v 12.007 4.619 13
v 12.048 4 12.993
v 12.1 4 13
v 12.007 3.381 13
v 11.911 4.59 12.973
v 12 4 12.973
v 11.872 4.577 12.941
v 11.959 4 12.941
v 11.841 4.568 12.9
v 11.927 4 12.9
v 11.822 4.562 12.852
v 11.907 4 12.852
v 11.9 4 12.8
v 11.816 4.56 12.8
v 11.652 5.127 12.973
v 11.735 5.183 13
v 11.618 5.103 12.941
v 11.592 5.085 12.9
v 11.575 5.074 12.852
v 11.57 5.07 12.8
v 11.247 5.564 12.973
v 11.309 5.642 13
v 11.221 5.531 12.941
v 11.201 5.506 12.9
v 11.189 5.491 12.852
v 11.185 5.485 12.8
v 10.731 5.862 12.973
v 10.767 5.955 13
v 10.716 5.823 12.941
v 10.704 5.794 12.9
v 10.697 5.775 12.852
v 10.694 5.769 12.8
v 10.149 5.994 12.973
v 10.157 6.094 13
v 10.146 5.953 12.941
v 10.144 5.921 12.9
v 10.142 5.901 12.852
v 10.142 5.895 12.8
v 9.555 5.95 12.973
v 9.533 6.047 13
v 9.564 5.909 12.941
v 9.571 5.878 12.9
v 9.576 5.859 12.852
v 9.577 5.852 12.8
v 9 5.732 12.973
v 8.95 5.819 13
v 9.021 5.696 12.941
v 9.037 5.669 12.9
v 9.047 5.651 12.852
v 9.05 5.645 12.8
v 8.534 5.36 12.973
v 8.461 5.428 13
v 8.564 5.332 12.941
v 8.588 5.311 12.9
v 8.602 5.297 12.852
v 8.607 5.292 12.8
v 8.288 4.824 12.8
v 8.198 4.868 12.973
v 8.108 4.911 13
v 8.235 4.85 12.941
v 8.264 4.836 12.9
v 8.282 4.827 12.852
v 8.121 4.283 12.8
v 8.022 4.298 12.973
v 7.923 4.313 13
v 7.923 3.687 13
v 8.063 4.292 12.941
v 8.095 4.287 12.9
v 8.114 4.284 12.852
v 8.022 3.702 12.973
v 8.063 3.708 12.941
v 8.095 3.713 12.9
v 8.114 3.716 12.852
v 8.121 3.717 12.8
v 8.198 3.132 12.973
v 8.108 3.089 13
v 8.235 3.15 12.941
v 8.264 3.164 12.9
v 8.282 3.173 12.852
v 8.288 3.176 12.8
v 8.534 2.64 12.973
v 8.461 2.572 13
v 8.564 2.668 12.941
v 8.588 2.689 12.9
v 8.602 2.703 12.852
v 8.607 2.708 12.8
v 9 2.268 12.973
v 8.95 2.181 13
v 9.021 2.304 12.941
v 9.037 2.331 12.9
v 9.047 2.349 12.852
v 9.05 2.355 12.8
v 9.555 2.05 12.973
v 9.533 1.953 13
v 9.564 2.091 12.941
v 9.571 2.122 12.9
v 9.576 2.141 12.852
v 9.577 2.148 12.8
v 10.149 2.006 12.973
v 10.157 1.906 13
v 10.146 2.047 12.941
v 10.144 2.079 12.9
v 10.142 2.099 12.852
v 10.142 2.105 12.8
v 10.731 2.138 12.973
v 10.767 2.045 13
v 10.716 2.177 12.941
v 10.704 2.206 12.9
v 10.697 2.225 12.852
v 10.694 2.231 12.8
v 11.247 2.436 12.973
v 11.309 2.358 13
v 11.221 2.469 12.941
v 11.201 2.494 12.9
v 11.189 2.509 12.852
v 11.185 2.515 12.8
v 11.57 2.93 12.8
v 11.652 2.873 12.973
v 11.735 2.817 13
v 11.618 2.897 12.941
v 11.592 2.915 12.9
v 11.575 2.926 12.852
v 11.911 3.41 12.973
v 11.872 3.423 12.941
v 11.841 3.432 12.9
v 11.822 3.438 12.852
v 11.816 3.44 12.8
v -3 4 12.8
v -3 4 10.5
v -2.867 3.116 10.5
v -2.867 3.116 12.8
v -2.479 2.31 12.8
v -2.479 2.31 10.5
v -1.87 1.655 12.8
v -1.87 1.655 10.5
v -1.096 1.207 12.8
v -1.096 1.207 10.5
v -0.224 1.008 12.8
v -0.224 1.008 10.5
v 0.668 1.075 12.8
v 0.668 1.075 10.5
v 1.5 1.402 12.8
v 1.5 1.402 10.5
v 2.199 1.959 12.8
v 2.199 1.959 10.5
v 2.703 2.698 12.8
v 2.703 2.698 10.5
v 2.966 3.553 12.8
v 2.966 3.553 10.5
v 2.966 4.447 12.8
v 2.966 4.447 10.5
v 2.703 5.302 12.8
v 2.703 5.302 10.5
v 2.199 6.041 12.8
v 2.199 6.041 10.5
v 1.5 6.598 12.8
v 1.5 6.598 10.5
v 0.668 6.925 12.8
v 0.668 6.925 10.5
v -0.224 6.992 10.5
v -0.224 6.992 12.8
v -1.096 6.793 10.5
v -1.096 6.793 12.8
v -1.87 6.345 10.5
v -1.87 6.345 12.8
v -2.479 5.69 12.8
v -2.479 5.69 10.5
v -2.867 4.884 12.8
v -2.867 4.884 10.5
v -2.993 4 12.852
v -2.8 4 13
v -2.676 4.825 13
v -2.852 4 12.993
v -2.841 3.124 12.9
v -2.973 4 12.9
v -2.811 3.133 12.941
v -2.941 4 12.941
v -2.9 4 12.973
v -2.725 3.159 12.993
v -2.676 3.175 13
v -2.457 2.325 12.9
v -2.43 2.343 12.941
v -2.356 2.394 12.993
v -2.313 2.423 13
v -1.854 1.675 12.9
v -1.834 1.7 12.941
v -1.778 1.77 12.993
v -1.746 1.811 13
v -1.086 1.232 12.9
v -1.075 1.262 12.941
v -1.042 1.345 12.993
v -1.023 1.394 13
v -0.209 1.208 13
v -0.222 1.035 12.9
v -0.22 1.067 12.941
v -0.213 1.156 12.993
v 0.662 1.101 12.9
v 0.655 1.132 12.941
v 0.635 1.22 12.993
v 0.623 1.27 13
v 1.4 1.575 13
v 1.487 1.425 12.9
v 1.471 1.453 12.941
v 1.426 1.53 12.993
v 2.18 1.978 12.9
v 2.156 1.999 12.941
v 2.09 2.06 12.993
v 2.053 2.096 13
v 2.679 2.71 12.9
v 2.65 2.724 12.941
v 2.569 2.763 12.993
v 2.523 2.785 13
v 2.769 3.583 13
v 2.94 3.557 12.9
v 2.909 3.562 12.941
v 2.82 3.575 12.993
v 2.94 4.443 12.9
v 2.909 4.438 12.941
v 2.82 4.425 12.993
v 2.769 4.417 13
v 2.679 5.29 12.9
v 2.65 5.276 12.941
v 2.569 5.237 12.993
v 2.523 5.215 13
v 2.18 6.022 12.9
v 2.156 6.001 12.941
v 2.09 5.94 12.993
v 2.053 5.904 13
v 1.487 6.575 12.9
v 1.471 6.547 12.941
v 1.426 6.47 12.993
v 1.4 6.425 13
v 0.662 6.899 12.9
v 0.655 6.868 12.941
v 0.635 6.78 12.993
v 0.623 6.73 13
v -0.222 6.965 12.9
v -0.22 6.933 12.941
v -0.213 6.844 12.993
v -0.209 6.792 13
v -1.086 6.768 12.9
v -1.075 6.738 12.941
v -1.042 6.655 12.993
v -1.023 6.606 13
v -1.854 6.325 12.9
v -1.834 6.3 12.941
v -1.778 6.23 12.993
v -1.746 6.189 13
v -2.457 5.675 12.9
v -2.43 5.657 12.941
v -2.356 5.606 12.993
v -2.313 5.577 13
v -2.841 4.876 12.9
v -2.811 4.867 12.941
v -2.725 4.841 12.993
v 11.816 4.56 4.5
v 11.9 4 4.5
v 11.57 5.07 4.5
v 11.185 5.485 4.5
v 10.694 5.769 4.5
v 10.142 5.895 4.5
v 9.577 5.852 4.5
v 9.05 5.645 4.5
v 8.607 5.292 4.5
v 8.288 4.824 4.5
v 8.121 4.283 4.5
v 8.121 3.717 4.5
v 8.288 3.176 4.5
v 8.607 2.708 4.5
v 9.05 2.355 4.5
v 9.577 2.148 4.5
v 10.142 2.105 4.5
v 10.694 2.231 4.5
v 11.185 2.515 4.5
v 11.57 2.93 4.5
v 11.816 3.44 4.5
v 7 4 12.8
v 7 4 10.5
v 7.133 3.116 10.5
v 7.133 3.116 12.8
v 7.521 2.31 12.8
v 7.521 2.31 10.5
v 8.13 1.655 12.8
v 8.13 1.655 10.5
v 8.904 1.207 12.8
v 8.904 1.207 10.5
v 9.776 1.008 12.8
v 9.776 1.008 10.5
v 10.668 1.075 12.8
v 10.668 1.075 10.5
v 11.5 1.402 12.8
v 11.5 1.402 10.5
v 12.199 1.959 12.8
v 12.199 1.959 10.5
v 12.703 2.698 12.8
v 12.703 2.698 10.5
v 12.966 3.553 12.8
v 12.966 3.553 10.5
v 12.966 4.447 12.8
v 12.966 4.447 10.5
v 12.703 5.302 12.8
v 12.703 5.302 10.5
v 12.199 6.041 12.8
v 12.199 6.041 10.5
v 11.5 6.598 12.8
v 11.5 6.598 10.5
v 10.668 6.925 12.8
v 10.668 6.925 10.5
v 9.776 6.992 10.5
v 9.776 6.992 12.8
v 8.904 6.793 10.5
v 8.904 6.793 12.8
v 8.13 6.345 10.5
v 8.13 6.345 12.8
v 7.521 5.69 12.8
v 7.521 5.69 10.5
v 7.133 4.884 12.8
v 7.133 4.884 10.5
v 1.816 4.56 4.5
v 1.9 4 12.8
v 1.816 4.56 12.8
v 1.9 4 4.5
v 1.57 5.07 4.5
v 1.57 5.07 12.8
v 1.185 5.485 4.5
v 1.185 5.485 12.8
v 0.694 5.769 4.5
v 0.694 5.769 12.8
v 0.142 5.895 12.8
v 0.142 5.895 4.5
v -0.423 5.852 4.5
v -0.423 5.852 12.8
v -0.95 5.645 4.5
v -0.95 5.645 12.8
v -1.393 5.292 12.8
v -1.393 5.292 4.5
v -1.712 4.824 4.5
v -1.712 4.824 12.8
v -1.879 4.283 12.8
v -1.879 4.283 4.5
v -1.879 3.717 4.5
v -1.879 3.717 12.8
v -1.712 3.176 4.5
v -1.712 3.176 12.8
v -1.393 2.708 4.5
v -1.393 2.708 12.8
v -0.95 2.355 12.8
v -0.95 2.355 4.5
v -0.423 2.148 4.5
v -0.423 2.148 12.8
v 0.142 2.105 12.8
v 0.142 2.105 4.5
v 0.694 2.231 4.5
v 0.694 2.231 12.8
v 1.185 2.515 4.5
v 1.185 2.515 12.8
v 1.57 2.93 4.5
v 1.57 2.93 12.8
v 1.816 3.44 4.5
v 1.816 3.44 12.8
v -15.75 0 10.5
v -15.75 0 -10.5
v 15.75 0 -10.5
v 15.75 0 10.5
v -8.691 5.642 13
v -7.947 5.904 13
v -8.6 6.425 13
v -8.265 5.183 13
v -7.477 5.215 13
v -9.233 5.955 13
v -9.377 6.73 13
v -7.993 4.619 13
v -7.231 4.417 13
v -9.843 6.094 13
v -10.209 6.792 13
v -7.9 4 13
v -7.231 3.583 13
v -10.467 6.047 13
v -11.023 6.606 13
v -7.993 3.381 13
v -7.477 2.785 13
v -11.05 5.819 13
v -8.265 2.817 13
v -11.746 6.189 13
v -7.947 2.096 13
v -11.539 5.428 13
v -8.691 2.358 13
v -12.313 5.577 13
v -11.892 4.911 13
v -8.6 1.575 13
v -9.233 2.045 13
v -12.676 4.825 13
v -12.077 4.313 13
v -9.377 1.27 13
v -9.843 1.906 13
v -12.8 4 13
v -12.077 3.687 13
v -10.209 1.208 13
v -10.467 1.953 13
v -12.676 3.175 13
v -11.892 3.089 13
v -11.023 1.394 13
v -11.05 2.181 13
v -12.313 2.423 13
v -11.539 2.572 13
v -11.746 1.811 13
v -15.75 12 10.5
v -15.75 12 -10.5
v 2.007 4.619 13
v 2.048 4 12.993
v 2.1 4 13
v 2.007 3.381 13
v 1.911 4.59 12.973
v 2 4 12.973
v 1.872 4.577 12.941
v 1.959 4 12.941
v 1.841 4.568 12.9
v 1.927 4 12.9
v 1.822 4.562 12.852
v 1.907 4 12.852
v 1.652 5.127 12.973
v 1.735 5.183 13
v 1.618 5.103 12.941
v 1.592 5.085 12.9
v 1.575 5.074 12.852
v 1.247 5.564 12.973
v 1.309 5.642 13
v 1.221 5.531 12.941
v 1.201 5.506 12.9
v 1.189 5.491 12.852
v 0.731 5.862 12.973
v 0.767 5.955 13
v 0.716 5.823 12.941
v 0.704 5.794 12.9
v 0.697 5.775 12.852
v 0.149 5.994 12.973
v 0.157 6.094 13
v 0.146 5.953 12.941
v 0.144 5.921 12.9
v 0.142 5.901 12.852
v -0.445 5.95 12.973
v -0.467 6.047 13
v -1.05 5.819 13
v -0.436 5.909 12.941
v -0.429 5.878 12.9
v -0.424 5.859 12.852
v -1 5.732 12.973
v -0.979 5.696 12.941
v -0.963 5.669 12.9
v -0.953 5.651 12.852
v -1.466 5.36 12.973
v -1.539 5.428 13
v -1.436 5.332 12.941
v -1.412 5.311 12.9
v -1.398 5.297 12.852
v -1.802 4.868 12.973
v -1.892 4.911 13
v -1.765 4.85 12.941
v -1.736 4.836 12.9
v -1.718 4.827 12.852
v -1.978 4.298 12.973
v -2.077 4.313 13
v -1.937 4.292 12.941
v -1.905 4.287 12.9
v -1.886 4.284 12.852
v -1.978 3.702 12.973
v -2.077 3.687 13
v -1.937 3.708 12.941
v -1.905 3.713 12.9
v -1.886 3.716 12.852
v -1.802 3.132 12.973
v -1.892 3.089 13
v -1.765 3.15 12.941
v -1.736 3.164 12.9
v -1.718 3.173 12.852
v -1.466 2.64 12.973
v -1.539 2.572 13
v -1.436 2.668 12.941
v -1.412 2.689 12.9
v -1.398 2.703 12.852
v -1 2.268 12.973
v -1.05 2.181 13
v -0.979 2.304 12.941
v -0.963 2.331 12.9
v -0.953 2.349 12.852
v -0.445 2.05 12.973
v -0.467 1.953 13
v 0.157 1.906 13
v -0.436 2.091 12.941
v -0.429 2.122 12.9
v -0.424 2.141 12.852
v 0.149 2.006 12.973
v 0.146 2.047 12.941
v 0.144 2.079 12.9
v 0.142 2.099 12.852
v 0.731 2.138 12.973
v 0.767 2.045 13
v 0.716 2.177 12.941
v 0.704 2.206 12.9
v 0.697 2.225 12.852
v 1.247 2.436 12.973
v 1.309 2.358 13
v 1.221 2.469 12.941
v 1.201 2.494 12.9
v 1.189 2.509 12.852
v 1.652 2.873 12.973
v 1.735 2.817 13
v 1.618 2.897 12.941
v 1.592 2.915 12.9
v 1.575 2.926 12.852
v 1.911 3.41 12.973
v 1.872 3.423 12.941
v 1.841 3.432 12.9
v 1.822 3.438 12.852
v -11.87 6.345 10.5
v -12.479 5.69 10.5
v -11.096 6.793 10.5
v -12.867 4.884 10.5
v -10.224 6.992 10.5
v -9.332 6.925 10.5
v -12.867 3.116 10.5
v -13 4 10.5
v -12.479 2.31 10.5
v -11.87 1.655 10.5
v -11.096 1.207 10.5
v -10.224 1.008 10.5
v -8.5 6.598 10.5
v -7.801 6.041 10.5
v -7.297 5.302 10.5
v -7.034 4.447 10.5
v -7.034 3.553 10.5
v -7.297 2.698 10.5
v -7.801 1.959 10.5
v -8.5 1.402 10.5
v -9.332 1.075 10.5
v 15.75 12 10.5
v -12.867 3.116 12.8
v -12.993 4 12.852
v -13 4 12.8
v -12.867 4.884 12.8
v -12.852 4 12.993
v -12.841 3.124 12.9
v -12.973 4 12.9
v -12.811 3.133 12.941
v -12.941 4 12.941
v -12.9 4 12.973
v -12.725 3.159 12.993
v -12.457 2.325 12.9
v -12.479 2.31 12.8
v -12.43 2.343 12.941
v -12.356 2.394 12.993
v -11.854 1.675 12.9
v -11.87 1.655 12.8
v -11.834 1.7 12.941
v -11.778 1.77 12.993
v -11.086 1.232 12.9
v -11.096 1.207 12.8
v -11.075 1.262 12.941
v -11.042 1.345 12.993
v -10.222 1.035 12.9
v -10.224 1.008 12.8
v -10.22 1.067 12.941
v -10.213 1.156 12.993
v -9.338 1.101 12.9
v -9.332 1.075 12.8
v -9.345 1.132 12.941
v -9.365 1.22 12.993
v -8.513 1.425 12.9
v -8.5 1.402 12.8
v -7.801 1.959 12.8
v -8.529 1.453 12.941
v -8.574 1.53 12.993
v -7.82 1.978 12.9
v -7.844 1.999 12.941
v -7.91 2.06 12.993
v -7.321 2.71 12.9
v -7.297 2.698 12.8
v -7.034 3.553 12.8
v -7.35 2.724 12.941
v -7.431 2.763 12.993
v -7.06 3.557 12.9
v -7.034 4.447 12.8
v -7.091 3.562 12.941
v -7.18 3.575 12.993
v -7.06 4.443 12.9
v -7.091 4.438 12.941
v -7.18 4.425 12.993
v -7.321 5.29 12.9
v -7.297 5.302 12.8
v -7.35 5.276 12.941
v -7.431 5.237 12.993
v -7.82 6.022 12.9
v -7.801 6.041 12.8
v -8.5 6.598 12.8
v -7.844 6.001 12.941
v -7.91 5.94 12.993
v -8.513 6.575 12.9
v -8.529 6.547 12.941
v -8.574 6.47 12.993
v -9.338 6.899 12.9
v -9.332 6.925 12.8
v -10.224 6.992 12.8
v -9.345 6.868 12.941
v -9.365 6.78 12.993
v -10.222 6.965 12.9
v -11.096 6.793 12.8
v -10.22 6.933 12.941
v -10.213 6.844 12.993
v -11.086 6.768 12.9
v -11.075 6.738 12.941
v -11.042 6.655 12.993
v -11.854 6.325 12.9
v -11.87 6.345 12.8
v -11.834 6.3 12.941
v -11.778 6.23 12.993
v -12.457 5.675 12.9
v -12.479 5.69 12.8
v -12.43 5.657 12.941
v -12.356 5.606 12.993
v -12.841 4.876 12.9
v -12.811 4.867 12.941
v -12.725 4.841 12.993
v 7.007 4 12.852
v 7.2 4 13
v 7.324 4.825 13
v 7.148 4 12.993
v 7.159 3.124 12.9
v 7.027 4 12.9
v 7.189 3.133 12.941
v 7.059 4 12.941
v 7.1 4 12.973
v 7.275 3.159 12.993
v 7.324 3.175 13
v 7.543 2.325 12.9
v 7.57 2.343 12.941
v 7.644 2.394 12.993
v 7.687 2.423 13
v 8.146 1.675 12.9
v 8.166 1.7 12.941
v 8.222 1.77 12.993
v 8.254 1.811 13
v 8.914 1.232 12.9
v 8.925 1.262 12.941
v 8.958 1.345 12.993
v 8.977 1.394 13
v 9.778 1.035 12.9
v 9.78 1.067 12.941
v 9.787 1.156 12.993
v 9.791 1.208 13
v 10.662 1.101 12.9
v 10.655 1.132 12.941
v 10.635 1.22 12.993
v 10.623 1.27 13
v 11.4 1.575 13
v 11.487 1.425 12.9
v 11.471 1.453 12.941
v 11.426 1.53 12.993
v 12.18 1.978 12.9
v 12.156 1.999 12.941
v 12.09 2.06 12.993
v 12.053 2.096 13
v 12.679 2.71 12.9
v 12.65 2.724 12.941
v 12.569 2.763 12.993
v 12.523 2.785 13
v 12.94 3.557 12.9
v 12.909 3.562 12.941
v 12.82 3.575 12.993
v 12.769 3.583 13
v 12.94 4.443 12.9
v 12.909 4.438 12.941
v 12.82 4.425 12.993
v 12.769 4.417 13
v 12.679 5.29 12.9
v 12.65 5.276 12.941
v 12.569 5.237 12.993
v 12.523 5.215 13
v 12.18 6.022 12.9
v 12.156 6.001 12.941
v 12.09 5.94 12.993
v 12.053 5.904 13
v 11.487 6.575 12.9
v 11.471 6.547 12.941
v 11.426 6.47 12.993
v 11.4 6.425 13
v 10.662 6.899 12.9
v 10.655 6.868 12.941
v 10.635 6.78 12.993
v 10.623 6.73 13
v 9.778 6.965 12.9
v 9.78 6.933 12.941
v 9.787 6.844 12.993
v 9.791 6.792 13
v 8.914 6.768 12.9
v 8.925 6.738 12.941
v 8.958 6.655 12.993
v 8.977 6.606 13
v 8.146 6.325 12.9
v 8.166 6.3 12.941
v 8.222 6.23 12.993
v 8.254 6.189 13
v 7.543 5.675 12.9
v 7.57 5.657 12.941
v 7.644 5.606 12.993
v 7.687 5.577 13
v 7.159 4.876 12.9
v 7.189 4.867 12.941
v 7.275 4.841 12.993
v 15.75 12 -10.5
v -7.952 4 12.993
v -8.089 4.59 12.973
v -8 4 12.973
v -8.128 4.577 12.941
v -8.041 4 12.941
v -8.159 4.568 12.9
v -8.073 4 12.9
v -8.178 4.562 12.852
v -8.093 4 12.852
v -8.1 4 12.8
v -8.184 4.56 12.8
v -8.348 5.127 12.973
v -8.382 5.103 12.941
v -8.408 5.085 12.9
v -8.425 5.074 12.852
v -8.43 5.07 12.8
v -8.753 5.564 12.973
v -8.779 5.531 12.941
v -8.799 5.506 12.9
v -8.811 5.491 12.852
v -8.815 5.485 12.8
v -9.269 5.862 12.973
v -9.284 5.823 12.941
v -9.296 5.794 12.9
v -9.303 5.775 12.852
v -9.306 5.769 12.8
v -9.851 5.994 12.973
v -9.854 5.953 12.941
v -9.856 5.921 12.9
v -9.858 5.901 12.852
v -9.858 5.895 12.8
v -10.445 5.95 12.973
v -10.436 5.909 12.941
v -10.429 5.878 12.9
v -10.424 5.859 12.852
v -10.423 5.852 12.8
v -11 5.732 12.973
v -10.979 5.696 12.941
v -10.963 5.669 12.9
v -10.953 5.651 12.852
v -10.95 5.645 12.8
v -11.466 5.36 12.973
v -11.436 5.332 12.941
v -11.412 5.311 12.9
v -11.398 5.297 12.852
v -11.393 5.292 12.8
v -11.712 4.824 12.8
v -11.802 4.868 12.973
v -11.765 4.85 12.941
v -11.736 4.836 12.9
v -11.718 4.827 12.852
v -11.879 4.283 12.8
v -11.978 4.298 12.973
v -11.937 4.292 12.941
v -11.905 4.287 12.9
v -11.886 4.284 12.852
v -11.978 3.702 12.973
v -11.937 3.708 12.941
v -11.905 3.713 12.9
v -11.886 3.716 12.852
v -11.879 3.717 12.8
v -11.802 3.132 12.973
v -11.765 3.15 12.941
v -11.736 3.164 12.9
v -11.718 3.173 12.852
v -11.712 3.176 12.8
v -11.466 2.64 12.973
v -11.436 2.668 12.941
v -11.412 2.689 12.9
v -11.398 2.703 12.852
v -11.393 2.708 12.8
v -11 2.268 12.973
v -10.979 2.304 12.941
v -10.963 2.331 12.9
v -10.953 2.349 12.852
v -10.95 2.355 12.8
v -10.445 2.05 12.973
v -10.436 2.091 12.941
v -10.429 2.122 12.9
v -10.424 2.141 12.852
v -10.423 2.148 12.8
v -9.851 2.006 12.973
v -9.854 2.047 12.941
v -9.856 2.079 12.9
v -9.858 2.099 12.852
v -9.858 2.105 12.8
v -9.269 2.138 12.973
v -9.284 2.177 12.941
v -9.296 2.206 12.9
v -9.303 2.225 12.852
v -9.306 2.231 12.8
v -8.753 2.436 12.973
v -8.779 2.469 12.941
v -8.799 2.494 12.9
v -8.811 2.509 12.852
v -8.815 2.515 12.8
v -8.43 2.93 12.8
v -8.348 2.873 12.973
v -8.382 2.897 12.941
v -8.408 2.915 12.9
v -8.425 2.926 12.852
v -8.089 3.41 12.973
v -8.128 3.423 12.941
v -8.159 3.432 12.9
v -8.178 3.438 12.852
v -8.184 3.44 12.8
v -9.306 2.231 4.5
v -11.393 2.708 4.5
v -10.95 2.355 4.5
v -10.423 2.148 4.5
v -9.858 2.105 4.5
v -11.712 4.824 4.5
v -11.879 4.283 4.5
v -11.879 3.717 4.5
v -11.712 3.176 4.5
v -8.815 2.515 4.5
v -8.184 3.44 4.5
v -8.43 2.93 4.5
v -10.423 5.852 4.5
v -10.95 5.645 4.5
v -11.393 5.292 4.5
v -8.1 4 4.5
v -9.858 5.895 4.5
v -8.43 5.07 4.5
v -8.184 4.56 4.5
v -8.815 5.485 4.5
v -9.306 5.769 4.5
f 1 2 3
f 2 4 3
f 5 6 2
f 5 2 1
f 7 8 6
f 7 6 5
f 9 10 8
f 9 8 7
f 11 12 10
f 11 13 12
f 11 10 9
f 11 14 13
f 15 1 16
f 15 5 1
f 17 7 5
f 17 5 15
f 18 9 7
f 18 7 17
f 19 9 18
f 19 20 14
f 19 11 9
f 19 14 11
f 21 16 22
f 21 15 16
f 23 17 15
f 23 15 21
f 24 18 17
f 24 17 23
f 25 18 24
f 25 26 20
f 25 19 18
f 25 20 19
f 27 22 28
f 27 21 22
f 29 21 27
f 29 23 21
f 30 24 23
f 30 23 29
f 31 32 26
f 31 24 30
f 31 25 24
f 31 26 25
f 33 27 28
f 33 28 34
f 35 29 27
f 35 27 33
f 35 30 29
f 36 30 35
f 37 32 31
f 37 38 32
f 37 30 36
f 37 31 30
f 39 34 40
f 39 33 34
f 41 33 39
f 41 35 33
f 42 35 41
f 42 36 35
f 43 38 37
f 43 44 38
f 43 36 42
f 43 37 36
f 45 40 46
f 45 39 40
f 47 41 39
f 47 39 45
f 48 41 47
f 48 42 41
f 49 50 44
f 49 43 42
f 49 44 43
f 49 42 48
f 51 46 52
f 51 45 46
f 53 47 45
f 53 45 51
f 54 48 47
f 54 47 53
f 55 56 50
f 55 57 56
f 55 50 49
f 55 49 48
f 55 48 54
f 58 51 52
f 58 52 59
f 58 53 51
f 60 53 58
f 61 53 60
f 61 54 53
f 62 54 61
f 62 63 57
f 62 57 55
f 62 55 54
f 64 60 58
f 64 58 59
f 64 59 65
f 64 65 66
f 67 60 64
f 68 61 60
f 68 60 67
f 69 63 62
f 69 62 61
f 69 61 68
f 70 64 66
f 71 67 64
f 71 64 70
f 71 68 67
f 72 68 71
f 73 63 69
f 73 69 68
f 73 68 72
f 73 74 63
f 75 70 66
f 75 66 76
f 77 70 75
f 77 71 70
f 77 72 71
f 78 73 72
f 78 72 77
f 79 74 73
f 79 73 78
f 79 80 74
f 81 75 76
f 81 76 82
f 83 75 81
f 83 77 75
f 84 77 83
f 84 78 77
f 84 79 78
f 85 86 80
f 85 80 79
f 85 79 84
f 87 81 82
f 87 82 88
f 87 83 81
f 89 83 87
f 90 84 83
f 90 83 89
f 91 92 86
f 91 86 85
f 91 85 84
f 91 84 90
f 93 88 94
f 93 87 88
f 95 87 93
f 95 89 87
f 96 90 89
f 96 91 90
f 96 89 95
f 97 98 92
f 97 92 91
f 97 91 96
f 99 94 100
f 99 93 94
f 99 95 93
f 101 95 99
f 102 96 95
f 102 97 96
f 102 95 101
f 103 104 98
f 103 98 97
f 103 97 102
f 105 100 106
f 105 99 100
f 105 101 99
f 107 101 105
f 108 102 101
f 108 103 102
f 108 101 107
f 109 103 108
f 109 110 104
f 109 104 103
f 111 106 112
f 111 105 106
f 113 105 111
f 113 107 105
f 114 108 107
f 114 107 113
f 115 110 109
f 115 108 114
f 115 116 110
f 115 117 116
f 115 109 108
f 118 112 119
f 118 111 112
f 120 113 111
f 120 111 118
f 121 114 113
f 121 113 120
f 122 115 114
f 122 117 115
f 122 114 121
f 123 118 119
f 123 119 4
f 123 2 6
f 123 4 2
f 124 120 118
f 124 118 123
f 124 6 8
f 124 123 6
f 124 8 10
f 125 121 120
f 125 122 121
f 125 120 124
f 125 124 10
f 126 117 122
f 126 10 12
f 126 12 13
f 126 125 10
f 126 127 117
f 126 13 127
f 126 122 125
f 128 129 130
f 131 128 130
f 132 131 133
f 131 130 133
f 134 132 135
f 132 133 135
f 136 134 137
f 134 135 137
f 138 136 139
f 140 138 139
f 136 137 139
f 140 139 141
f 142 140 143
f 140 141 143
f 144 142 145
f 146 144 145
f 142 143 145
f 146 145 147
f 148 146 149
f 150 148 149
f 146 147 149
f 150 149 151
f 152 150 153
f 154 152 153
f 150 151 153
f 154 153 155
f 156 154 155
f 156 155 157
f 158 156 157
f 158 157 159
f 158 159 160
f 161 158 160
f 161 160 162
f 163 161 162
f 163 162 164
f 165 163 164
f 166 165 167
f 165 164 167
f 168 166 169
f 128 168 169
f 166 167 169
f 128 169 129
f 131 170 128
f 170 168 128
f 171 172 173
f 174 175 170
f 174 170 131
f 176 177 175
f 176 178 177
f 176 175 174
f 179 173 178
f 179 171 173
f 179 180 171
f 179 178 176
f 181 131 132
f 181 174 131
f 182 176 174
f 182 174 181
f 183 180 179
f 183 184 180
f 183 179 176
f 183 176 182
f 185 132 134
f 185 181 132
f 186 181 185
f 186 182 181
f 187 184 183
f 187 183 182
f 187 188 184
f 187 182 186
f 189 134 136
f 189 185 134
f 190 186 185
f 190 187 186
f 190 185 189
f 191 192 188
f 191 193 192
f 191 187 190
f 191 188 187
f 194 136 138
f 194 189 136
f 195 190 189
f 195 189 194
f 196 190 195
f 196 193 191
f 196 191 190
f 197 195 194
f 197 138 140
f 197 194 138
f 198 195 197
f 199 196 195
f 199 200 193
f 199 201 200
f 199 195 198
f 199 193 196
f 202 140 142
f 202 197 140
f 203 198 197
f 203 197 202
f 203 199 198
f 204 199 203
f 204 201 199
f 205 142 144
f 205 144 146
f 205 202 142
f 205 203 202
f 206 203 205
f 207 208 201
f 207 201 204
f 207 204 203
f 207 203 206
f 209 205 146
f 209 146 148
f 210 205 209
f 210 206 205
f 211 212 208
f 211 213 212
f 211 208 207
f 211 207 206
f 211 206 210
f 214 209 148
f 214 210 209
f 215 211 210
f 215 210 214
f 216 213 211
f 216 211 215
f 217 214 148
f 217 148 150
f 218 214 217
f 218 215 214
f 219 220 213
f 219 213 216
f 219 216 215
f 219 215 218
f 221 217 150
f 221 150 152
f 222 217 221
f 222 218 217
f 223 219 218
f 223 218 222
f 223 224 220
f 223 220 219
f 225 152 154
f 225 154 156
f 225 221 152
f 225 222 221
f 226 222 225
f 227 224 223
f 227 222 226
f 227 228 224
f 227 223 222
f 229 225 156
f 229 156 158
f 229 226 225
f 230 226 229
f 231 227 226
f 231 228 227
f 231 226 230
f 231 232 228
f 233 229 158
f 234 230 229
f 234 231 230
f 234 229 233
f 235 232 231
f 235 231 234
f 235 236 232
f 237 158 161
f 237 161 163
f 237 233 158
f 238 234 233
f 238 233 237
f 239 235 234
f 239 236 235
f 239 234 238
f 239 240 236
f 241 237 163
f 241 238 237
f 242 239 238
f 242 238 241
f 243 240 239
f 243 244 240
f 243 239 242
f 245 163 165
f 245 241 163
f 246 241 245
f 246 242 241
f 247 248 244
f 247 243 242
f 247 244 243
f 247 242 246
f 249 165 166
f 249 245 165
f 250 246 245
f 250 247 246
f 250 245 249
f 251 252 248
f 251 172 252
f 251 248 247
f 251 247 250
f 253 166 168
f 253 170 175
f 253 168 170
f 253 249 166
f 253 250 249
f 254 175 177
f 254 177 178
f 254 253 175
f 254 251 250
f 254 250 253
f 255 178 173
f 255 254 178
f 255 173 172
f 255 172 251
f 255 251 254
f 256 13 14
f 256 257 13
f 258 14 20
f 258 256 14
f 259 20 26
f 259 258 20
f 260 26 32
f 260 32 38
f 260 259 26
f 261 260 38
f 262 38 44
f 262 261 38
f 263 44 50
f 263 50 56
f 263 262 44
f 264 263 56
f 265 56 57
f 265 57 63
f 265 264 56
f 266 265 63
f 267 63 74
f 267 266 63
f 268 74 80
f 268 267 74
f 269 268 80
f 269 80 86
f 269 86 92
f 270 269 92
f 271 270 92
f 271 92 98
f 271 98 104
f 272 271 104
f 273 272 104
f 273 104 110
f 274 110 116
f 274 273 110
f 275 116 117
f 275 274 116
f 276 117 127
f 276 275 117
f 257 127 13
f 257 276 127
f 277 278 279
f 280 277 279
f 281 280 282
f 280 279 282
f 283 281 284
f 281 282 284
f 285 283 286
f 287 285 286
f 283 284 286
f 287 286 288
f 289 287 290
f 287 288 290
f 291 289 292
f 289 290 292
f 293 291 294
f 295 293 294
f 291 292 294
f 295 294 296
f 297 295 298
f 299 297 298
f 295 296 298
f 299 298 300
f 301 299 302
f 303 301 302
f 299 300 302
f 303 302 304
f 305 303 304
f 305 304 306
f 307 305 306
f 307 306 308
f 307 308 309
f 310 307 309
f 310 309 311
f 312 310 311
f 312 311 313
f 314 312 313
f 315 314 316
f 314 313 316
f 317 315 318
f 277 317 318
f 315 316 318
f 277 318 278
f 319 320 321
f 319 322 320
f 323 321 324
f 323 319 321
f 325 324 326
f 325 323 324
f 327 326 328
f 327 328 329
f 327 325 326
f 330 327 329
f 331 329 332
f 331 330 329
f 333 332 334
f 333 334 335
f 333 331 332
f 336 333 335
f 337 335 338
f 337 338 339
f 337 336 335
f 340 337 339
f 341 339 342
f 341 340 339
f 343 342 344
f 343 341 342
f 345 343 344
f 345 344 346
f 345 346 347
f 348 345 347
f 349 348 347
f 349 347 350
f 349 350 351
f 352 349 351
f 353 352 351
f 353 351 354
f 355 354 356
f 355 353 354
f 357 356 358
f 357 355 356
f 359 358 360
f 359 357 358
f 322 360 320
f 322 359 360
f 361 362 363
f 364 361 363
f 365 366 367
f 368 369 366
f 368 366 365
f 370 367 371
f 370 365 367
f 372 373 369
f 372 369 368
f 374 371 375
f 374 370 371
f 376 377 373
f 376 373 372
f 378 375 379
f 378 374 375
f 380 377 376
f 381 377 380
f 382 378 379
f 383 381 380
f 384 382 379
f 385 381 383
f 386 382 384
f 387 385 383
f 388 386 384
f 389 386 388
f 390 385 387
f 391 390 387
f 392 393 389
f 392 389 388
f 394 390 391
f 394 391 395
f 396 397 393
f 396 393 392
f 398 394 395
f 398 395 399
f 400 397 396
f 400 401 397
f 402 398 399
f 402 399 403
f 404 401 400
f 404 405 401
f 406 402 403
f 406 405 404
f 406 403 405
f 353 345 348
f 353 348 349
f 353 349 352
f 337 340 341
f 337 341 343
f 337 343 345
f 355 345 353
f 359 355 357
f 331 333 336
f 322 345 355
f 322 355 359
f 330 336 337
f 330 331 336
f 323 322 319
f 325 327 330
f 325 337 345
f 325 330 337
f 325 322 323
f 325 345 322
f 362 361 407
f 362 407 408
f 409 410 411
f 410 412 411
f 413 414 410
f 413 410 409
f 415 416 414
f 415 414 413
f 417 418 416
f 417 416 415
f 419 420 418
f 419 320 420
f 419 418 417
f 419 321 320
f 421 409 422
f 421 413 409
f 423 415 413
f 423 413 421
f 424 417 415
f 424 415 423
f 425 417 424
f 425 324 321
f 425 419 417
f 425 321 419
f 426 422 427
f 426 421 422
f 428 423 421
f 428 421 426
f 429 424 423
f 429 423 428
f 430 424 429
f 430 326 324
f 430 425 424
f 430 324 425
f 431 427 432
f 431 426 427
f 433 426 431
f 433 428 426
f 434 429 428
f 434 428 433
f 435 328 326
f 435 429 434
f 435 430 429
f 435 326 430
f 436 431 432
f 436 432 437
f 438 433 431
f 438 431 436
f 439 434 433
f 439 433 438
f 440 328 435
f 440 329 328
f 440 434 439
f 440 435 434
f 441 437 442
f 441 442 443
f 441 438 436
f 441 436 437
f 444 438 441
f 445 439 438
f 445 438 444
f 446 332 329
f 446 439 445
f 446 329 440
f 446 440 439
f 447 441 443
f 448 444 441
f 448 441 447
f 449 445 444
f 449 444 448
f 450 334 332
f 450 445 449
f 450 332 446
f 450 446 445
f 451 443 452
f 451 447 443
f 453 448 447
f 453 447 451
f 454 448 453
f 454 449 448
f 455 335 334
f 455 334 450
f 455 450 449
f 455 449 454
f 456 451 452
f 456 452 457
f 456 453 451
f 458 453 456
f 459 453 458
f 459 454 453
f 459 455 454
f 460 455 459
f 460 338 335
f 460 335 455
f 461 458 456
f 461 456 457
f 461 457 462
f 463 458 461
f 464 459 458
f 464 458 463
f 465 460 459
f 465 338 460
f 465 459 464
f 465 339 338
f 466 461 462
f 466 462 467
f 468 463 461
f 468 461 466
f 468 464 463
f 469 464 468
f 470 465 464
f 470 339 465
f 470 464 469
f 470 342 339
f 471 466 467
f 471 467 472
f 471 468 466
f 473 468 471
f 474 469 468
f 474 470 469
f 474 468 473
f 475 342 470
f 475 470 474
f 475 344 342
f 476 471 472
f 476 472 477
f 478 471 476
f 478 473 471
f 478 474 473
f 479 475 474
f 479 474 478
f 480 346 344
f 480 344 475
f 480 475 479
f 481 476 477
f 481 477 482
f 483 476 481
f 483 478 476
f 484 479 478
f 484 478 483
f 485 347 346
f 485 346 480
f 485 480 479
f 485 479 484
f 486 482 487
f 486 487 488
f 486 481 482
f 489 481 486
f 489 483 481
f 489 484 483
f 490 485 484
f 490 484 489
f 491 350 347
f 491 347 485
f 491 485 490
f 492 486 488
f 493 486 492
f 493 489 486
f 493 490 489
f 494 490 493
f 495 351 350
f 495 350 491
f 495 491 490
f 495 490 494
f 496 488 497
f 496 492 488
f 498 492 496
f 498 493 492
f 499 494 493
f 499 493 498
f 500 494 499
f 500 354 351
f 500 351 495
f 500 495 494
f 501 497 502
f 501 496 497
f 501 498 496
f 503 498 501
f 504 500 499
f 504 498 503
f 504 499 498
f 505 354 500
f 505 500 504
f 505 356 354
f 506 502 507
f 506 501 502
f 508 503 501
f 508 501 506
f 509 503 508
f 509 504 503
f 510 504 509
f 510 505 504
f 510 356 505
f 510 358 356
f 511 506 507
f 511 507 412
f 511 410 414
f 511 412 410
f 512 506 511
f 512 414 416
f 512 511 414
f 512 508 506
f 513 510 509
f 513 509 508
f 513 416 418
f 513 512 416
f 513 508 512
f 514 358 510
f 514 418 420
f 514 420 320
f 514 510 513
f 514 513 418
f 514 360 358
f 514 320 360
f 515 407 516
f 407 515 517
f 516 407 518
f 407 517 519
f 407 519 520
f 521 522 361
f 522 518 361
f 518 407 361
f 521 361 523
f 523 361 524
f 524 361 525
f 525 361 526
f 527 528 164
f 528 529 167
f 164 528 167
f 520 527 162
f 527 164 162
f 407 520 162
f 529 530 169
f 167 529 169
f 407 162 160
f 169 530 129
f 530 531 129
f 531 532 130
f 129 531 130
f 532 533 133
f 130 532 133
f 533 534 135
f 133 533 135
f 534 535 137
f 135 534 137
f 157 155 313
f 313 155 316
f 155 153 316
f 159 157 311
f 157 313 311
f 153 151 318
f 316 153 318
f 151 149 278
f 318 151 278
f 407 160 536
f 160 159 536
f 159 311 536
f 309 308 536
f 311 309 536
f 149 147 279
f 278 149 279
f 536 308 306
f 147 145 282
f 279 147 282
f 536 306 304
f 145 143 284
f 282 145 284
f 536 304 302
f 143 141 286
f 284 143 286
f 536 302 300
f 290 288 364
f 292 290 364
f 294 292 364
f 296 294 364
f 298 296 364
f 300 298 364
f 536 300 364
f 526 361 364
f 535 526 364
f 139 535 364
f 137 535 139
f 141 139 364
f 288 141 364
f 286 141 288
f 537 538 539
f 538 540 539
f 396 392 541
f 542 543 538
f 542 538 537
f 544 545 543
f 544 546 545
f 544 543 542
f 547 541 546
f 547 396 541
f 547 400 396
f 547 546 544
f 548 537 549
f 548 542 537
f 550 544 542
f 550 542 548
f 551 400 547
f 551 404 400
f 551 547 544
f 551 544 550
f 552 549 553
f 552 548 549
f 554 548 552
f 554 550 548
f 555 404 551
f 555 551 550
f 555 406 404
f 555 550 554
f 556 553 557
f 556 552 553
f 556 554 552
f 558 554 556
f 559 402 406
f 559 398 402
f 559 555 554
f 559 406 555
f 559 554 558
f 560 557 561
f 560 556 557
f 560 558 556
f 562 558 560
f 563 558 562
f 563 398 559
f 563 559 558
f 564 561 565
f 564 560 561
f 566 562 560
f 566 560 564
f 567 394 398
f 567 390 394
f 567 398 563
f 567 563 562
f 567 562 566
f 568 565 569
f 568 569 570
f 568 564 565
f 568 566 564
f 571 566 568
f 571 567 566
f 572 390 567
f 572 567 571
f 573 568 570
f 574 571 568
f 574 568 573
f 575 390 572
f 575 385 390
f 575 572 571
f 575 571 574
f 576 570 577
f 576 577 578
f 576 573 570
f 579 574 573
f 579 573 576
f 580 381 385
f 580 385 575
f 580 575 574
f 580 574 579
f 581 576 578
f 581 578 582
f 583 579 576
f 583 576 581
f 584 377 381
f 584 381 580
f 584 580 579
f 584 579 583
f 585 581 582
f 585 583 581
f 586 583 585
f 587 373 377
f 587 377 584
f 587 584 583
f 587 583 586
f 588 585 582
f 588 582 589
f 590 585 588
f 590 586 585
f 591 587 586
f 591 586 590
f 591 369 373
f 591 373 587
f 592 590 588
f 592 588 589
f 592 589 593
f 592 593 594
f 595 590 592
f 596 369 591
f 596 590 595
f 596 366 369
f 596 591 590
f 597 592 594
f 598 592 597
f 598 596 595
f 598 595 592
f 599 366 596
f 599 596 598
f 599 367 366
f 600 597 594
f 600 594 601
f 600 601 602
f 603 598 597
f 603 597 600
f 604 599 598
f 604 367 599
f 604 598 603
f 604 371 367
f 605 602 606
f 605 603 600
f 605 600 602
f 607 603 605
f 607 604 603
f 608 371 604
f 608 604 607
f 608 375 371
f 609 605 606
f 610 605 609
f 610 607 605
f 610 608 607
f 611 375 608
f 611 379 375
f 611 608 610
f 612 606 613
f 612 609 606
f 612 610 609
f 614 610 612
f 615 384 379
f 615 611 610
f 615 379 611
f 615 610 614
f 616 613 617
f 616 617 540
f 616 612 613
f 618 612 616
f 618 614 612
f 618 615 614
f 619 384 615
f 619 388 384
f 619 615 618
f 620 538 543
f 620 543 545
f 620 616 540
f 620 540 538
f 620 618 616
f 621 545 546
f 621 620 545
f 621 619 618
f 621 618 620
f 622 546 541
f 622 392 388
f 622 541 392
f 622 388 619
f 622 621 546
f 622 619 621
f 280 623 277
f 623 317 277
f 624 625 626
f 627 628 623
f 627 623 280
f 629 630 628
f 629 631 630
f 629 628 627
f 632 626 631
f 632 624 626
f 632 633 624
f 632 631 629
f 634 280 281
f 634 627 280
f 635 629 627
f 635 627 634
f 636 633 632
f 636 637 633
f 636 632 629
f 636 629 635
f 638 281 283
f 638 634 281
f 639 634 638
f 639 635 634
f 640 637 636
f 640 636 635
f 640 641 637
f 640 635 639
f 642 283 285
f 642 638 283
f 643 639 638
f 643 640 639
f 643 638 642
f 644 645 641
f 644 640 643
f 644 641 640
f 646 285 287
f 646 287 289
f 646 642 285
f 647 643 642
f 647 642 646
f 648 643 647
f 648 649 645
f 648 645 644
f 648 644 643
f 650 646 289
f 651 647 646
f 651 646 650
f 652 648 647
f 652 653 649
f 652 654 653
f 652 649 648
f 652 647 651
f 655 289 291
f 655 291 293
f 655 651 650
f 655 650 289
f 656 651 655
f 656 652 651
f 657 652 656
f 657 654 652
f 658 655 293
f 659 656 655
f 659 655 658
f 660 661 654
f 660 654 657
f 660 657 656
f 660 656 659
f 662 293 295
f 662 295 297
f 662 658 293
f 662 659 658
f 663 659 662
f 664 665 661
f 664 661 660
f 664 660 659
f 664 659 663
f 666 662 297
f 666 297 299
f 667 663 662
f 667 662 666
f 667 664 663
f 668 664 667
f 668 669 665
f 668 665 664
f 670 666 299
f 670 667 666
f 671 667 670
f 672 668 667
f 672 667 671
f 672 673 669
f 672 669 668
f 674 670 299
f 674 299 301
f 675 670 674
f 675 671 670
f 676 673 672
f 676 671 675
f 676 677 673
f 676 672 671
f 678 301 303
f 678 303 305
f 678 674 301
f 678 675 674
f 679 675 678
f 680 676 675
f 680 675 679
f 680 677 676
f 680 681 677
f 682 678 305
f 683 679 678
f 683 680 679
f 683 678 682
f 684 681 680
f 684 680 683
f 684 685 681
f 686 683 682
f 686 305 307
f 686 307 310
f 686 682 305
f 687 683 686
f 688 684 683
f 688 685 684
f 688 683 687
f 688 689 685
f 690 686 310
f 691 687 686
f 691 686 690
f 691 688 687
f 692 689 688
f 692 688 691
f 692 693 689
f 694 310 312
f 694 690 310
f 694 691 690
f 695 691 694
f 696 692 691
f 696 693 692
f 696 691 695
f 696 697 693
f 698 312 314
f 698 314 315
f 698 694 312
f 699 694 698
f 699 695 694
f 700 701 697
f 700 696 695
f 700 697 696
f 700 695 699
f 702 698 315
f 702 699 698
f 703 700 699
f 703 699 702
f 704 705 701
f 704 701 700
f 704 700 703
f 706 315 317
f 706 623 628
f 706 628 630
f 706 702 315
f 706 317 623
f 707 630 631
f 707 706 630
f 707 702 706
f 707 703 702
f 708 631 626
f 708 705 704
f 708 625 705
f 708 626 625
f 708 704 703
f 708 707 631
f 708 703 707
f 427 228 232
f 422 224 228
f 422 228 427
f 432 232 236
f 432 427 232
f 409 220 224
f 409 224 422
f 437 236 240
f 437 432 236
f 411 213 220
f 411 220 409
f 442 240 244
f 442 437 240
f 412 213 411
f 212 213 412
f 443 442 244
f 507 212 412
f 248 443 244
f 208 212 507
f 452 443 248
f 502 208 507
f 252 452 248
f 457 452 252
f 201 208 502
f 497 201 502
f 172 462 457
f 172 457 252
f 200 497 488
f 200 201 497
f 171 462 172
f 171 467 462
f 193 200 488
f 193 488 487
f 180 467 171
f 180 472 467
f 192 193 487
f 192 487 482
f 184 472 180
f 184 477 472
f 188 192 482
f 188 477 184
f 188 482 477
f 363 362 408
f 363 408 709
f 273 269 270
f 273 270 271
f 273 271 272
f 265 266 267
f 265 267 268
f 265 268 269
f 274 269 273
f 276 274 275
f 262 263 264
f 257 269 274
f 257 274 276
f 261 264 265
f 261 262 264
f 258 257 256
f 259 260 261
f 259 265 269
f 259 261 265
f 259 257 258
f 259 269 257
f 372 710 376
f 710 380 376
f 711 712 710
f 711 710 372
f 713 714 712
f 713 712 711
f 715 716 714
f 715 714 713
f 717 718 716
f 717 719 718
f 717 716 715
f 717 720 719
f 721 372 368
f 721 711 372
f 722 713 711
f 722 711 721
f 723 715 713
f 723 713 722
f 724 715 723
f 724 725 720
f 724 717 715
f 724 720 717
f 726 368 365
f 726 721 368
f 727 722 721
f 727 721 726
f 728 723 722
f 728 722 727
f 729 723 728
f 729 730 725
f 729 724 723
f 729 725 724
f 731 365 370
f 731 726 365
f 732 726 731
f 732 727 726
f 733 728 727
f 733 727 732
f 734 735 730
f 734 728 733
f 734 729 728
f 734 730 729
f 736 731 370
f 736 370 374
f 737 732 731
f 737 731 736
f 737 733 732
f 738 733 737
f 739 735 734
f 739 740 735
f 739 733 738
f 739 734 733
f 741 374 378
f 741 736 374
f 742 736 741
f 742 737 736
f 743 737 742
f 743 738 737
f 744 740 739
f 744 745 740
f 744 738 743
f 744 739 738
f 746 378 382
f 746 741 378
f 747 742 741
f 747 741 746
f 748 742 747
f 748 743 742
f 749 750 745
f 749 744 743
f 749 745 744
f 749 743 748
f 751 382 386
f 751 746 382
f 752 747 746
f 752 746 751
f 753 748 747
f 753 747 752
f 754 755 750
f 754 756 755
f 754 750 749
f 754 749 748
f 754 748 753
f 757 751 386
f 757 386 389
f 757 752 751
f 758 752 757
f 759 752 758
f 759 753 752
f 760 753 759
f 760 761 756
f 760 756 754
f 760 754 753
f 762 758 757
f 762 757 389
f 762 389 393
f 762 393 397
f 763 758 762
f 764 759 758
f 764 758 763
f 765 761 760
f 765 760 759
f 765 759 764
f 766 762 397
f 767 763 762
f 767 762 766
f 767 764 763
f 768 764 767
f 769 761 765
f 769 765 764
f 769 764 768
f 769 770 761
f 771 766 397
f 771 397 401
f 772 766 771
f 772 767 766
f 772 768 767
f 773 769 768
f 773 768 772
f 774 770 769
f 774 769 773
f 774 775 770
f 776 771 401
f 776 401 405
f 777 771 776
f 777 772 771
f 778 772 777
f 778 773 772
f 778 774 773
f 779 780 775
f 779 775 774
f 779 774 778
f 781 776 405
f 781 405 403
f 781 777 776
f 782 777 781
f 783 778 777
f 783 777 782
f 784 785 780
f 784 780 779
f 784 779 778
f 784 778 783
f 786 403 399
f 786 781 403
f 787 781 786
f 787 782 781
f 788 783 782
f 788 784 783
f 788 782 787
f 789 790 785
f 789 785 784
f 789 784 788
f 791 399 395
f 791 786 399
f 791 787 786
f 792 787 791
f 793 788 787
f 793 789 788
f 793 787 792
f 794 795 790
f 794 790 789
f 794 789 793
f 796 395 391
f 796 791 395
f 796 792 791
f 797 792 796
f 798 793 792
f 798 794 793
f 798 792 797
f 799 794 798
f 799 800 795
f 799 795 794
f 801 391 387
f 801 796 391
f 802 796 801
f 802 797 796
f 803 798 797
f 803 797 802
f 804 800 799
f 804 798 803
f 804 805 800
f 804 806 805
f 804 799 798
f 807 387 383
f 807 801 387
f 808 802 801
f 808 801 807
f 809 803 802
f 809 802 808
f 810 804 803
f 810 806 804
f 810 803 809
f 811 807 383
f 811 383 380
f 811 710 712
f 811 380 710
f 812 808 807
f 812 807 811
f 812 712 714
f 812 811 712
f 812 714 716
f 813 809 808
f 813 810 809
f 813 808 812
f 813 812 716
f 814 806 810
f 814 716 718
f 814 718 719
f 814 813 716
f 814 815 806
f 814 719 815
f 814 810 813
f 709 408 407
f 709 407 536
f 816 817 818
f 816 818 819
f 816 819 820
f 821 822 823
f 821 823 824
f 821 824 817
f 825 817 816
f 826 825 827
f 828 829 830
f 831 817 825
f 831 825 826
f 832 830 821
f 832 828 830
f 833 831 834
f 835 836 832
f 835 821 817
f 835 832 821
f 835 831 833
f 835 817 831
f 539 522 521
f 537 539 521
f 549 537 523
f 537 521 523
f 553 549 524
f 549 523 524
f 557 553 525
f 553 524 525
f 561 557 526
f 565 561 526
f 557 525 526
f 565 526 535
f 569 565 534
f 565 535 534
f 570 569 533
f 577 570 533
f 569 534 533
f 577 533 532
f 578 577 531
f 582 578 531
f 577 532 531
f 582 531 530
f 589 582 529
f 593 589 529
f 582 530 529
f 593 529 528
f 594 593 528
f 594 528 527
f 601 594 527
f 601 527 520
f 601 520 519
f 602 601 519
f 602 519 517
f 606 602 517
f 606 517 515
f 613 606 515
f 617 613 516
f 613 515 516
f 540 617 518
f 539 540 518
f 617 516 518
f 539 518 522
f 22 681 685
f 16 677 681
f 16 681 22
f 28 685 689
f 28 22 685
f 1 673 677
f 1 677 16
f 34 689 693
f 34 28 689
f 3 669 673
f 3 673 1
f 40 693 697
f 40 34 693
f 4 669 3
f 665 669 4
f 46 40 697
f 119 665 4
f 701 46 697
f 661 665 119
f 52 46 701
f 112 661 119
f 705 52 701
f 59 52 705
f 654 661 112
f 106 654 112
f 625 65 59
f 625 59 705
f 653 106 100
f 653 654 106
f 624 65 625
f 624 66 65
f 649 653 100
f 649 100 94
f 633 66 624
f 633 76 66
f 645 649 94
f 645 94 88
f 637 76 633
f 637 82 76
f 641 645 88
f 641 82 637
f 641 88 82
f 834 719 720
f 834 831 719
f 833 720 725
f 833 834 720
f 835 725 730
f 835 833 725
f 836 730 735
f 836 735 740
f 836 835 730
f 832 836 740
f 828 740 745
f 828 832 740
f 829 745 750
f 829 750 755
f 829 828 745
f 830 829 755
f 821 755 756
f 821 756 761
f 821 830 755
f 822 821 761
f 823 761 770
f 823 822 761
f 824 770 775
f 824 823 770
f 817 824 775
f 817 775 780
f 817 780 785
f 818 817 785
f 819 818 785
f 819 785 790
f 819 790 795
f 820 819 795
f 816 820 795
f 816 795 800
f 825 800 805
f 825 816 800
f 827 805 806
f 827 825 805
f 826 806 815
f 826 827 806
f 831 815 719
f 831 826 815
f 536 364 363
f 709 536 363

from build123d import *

# Parameters (mm, degrees)
SKETCH1_W           = 31.5
SKETCH1_H           = 21
BOSS_EXTRUDE1_DEPTH = 12
SKETCH2_R           = 3
SKETCH2_R_2         = 1.9
BOSS_EXTRUDE2_DEPTH = 2.5
FILLET1_R           = 0.2
CUT_EXTRUDE1_START  = -6
SKETCH3_R           = 1.9
CUT_EXTRUDE1_DEPTH  = 6


with BuildPart() as part:
    # Sketch1 → Boss-Extrude1 (new body)
    with BuildSketch(Plane(origin=(0, 0, 0), x_dir=(1, 0, 0), z_dir=(0, 1, 0))):
        Rectangle(SKETCH1_W, SKETCH1_H)
    extrude(amount=BOSS_EXTRUDE1_DEPTH)

    # Sketch2 → Boss-Extrude2 (add)
    # profile 1 of 3: a face of its own
    with BuildSketch(Plane.XY.offset(10.5)):
        with Locations(Location((0, 4, 0), (0, 0, 180))):
            Circle(SKETCH2_R)
        with Locations((0, 4)):
            Circle(SKETCH2_R_2, mode=Mode.SUBTRACT)
    # profile 2 of 3: a face of its own
    with BuildSketch(Plane.XY.offset(10.5)):
        with Locations(Location((10, 4, 0), (0, 0, 180))):
            Circle(SKETCH2_R)
        with Locations((10, 4)):
            Circle(SKETCH2_R_2, mode=Mode.SUBTRACT)
    # profile 3 of 3: a face of its own
    with BuildSketch(Plane.XY.offset(10.5)):
        with Locations(Location((-10, 4, 0), (0, 0, 180))):
            Circle(SKETCH2_R)
        with Locations((-10, 4)):
            Circle(SKETCH2_R_2, mode=Mode.SUBTRACT)
    extrude(amount=BOSS_EXTRUDE2_DEPTH)

    # Fillet1
    fillet1_edges = [part.edges().sort_by_distance(p)[0] for p in [
        (3, 4, 13),
        (-1.9, 4, 13),
        (13, 4, 13),
        (8.1, 4, 13),
        (-7, 4, 13),
        (-11.9, 4, 13),
    ]]
    fillet(fillet1_edges, radius=FILLET1_R)

    # Sketch3 → Cut-Extrude1 (cut)
    with BuildSketch(Plane.XY.offset(10.5).offset(CUT_EXTRUDE1_START)):
        with Locations((-10, 4)):
            Circle(SKETCH3_R)
        with Locations((0, 4)):
            Circle(SKETCH3_R)
        with Locations((10, 4)):
            Circle(SKETCH3_R)
    extrude(amount=CUT_EXTRUDE1_DEPTH, mode=Mode.SUBTRACT)


solid = part.part
